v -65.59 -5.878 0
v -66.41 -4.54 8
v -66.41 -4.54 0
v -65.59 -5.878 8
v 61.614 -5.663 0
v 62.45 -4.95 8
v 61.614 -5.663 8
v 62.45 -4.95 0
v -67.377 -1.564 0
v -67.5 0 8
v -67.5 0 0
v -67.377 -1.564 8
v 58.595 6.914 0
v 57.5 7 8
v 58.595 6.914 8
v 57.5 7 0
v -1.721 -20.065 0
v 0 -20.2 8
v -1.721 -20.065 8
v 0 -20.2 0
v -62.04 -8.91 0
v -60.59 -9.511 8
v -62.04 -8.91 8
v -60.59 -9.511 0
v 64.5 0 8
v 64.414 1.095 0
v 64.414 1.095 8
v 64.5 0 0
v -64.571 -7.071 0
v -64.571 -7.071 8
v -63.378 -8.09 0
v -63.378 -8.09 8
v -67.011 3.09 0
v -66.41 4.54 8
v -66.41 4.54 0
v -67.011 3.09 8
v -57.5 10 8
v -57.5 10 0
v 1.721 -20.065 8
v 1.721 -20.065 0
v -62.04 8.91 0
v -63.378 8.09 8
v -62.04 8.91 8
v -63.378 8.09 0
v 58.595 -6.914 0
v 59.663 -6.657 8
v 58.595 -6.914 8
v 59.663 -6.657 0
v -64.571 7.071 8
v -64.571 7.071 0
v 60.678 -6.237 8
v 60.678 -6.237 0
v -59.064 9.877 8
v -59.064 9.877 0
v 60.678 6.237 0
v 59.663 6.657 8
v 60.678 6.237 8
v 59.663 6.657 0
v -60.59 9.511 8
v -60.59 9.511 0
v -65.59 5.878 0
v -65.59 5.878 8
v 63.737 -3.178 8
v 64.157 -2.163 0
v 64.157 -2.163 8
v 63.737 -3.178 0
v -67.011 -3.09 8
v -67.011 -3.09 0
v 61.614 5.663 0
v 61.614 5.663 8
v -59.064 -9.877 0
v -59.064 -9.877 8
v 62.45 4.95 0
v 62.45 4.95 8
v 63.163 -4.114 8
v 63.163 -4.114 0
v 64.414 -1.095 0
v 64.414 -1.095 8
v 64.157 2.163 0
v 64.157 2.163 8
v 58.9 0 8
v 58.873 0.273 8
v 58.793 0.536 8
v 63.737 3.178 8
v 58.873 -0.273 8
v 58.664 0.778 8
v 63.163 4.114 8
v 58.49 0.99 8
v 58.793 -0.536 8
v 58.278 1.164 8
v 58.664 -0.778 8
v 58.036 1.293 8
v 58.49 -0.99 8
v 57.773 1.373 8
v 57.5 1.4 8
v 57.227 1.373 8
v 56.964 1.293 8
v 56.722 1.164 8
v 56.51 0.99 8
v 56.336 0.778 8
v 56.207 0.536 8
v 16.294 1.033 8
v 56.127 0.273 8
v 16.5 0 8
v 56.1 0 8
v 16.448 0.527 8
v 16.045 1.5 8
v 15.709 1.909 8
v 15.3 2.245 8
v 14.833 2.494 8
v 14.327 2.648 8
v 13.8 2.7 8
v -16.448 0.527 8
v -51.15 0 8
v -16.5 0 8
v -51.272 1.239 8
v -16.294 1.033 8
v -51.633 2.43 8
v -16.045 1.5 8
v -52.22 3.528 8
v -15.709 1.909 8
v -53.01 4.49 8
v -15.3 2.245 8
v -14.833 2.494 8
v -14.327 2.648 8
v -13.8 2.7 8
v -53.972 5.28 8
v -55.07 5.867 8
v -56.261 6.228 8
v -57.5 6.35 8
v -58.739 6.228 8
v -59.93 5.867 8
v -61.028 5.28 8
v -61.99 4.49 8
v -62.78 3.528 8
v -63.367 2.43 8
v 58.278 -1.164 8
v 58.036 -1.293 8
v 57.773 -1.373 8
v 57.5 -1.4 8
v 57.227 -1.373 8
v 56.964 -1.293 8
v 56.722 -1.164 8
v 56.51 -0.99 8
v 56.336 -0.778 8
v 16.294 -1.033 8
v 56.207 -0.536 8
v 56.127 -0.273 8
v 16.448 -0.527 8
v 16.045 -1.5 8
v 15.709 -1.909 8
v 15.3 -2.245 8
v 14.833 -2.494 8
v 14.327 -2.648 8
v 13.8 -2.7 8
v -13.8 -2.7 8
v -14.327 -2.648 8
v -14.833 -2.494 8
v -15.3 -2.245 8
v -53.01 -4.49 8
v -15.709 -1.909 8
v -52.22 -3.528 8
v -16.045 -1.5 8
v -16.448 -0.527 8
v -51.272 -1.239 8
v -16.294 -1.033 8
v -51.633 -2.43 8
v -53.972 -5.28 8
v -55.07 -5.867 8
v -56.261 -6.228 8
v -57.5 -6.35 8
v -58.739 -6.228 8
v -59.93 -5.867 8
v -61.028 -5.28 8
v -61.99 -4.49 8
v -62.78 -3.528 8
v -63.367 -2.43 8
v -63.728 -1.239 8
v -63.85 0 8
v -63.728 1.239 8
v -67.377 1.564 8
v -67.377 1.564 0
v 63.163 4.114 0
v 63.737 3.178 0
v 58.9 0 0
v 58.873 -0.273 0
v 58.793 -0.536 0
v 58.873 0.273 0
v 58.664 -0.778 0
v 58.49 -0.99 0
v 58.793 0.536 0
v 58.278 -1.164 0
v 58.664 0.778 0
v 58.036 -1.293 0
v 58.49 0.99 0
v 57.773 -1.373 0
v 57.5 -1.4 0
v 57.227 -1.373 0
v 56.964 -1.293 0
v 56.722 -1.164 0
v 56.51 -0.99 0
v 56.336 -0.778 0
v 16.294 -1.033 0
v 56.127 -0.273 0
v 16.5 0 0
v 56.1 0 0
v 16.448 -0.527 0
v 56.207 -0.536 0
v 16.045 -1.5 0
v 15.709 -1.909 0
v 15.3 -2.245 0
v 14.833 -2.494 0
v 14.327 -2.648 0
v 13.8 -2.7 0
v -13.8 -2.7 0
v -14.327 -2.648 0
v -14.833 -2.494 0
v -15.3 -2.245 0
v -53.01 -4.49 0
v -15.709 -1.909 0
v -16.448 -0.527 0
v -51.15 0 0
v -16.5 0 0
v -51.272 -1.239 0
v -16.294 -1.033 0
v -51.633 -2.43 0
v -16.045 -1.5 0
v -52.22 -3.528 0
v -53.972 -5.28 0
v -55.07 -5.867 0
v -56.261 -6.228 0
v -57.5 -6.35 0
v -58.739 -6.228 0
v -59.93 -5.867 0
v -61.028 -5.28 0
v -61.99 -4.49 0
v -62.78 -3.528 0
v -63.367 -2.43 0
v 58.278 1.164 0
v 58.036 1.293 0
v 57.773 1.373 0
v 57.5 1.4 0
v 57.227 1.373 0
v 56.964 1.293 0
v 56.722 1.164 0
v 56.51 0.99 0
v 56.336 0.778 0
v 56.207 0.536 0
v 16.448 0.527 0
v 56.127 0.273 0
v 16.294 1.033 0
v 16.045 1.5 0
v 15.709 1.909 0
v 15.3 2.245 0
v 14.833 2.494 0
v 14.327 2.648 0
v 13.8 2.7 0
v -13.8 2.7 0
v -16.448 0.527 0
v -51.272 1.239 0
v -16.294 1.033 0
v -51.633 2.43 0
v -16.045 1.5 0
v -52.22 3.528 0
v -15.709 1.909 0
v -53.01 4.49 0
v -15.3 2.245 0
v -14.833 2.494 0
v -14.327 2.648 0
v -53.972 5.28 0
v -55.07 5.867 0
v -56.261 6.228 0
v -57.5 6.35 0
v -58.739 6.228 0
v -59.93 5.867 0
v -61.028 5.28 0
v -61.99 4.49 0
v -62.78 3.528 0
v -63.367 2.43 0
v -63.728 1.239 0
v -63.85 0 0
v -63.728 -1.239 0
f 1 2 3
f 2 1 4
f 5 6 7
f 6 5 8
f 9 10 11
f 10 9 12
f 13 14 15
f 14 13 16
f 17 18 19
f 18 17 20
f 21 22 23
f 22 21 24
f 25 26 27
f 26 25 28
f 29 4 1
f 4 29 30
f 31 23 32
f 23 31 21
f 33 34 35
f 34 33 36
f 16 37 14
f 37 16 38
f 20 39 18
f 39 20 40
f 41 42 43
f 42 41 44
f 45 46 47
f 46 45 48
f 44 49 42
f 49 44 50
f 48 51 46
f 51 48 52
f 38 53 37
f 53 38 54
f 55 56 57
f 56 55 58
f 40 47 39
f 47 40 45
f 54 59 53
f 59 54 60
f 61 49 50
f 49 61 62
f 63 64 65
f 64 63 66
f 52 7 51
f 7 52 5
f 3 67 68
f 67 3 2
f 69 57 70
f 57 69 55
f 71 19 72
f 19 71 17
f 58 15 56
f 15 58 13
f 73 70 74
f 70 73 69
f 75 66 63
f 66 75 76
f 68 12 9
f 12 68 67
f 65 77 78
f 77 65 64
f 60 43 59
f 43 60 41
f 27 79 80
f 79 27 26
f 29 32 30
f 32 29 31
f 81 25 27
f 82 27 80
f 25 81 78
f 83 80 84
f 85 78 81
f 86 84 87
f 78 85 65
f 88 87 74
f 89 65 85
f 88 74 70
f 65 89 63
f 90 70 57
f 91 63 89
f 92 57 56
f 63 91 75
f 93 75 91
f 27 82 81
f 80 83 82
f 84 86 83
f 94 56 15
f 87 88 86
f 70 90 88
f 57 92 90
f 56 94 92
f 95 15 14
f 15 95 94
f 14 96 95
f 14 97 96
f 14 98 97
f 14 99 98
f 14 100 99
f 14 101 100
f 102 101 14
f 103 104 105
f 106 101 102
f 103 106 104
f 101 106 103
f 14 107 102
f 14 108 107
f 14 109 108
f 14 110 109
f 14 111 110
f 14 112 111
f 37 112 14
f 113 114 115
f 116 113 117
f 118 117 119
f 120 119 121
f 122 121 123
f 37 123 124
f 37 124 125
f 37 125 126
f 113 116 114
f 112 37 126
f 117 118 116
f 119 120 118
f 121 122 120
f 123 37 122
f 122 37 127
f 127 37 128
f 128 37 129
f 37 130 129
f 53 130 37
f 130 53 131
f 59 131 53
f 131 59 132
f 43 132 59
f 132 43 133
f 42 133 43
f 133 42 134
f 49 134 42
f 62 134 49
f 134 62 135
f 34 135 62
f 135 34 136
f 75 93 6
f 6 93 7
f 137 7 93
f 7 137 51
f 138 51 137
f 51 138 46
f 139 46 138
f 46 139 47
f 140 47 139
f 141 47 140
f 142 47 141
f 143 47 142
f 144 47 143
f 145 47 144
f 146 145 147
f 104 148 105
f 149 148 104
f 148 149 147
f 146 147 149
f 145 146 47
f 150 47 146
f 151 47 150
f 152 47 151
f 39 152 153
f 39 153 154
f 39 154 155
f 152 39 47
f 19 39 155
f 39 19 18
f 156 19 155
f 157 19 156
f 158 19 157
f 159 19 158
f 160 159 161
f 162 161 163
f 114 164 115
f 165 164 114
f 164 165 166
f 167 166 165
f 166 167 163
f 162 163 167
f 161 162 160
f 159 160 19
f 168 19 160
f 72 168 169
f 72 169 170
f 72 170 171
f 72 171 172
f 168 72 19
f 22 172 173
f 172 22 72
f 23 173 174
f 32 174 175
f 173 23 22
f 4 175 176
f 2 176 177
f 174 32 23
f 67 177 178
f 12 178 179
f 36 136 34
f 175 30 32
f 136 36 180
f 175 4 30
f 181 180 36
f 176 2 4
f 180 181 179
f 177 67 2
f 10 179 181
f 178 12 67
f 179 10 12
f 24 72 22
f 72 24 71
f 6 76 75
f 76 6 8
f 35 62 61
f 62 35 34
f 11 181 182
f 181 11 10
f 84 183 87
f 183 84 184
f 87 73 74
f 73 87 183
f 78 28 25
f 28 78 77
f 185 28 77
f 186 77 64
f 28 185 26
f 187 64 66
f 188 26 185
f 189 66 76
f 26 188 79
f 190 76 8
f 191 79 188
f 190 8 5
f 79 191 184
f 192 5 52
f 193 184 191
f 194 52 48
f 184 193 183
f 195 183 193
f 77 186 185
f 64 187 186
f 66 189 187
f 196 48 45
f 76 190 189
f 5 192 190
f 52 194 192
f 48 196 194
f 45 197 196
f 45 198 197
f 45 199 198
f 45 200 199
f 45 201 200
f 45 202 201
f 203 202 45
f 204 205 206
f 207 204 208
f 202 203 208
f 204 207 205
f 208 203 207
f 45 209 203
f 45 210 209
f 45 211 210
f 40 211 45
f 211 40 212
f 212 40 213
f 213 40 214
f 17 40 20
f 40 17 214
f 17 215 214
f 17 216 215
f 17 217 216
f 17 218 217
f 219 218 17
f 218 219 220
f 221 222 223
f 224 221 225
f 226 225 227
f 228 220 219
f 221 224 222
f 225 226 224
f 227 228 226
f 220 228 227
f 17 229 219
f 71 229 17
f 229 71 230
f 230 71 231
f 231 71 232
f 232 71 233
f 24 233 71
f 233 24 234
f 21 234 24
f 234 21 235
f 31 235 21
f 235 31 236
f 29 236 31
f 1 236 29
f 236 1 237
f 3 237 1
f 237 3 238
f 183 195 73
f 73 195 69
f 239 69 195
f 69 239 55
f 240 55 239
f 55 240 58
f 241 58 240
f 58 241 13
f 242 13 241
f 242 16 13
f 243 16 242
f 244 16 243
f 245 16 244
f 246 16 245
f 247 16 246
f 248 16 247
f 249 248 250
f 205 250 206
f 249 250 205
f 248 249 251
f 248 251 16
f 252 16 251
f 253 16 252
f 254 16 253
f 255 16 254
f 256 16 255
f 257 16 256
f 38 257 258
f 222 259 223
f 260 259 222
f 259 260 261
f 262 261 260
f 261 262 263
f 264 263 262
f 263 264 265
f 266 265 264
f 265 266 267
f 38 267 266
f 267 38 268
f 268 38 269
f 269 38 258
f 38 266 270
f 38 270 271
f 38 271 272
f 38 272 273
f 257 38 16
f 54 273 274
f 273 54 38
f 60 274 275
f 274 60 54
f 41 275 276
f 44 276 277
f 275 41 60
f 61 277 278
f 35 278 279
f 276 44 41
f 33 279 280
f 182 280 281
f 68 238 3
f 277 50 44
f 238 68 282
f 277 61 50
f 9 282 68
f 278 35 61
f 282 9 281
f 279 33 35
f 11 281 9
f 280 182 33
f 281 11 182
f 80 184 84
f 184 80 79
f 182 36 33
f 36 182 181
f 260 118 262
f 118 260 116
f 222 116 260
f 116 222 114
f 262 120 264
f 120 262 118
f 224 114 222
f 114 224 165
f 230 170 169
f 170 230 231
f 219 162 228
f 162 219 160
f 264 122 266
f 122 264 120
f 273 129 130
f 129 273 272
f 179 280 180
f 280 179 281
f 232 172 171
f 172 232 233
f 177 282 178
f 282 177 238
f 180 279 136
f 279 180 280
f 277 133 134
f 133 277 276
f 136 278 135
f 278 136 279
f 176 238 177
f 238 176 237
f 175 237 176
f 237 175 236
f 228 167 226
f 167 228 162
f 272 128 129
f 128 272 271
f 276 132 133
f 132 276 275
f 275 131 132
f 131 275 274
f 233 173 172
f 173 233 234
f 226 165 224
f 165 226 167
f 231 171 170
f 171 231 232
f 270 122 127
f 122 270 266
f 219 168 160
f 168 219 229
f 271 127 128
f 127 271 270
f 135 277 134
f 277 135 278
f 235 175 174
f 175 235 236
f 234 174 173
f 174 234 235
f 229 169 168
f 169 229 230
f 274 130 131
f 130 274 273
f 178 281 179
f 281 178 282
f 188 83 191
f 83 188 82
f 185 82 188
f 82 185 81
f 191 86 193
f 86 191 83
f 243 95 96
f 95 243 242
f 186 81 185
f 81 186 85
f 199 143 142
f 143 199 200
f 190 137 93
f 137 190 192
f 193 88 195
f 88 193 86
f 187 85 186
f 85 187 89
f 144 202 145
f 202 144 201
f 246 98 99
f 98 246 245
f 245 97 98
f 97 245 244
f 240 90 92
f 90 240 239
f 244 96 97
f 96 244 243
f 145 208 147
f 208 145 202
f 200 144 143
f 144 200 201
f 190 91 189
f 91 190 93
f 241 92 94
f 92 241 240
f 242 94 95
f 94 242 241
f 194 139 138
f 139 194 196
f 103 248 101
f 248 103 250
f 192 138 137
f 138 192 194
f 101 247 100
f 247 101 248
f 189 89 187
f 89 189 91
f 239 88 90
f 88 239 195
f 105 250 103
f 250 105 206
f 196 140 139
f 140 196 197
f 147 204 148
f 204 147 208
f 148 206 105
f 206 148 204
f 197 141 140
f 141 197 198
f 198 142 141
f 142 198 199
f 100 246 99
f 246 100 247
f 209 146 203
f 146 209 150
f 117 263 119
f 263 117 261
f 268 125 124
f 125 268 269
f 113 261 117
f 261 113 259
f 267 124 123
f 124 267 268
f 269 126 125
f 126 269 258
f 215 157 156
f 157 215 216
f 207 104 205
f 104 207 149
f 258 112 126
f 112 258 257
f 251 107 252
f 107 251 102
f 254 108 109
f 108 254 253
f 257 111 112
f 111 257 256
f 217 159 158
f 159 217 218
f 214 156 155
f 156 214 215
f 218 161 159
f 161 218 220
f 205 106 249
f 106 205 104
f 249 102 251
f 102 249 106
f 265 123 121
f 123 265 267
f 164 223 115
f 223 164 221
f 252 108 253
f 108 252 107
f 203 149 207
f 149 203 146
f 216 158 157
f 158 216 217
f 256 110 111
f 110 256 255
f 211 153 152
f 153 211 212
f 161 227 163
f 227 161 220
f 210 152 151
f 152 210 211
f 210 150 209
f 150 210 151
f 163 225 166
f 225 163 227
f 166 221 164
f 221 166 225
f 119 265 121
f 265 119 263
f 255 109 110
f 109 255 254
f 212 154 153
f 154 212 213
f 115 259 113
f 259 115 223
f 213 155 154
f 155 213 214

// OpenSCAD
$fn = 32;

// ----------------------------------------------------------------------
// Lever: 115 mm between the bosses, 8 mm thick, smooth outline
// ----------------------------------------------------------------------

// --- parameters (mm) ---
lever_l = 115;            // distance between the boss centres
boss_a = 20;              // first boss diameter
boss_b = 14;              // second boss diameter
bore_a = 12.7;            // first bore
bore_b = 2.8;             // second bore
lever_t = 8;              // lever thickness
boss_c = 22;              // middle boss diameter
bend = 9.2;               // how far the middle boss drops
slot_w = 5.4;             // adjustment slot width

lever_profile = [[-67.5, 0], [-67.377, -1.564], [-67.011, -3.09], [-66.41, -4.54], [-65.59, -5.878], [-64.571, -7.071], [-63.378, -8.09], [-62.04, -8.91], [-60.59, -9.511], [-59.064, -9.877], [-1.721, -20.065], [0, -20.2], [1.721, -20.065], [58.595, -6.914], [59.663, -6.657], [60.678, -6.237], [61.614, -5.663], [62.45, -4.95], [63.163, -4.114], [63.737, -3.178], [64.157, -2.163], [64.414, -1.095], [64.5, 0], [64.414, 1.095], [64.157, 2.163], [63.737, 3.178], [63.163, 4.114], [62.45, 4.95], [61.614, 5.663], [60.678, 6.237], [59.663, 6.657], [58.595, 6.914], [57.5, 7], [-57.5, 10], [-59.064, 9.877], [-60.59, 9.511], [-62.04, 8.91], [-63.378, 8.09], [-64.571, 7.071], [-65.59, 5.878], [-66.41, 4.54], [-67.011, 3.09], [-67.377, 1.564]];

difference() {
  linear_extrude(height = lever_t) polygon(lever_profile);
  translate([-57.5, 0, -2.5]) cylinder(h = lever_t + 5, d = bore_a);
  translate([57.5, 0, -2.5]) cylinder(h = lever_t + 5, d = bore_b);
  /* slotted adjustment, stadium shaped */
  hull() {
    translate([-13.8, 0, -2.5]) cylinder(h = lever_t + 5, d = slot_w);
    translate([13.8, 0, -2.5]) cylinder(h = lever_t + 5, d = slot_w);
  }
}
